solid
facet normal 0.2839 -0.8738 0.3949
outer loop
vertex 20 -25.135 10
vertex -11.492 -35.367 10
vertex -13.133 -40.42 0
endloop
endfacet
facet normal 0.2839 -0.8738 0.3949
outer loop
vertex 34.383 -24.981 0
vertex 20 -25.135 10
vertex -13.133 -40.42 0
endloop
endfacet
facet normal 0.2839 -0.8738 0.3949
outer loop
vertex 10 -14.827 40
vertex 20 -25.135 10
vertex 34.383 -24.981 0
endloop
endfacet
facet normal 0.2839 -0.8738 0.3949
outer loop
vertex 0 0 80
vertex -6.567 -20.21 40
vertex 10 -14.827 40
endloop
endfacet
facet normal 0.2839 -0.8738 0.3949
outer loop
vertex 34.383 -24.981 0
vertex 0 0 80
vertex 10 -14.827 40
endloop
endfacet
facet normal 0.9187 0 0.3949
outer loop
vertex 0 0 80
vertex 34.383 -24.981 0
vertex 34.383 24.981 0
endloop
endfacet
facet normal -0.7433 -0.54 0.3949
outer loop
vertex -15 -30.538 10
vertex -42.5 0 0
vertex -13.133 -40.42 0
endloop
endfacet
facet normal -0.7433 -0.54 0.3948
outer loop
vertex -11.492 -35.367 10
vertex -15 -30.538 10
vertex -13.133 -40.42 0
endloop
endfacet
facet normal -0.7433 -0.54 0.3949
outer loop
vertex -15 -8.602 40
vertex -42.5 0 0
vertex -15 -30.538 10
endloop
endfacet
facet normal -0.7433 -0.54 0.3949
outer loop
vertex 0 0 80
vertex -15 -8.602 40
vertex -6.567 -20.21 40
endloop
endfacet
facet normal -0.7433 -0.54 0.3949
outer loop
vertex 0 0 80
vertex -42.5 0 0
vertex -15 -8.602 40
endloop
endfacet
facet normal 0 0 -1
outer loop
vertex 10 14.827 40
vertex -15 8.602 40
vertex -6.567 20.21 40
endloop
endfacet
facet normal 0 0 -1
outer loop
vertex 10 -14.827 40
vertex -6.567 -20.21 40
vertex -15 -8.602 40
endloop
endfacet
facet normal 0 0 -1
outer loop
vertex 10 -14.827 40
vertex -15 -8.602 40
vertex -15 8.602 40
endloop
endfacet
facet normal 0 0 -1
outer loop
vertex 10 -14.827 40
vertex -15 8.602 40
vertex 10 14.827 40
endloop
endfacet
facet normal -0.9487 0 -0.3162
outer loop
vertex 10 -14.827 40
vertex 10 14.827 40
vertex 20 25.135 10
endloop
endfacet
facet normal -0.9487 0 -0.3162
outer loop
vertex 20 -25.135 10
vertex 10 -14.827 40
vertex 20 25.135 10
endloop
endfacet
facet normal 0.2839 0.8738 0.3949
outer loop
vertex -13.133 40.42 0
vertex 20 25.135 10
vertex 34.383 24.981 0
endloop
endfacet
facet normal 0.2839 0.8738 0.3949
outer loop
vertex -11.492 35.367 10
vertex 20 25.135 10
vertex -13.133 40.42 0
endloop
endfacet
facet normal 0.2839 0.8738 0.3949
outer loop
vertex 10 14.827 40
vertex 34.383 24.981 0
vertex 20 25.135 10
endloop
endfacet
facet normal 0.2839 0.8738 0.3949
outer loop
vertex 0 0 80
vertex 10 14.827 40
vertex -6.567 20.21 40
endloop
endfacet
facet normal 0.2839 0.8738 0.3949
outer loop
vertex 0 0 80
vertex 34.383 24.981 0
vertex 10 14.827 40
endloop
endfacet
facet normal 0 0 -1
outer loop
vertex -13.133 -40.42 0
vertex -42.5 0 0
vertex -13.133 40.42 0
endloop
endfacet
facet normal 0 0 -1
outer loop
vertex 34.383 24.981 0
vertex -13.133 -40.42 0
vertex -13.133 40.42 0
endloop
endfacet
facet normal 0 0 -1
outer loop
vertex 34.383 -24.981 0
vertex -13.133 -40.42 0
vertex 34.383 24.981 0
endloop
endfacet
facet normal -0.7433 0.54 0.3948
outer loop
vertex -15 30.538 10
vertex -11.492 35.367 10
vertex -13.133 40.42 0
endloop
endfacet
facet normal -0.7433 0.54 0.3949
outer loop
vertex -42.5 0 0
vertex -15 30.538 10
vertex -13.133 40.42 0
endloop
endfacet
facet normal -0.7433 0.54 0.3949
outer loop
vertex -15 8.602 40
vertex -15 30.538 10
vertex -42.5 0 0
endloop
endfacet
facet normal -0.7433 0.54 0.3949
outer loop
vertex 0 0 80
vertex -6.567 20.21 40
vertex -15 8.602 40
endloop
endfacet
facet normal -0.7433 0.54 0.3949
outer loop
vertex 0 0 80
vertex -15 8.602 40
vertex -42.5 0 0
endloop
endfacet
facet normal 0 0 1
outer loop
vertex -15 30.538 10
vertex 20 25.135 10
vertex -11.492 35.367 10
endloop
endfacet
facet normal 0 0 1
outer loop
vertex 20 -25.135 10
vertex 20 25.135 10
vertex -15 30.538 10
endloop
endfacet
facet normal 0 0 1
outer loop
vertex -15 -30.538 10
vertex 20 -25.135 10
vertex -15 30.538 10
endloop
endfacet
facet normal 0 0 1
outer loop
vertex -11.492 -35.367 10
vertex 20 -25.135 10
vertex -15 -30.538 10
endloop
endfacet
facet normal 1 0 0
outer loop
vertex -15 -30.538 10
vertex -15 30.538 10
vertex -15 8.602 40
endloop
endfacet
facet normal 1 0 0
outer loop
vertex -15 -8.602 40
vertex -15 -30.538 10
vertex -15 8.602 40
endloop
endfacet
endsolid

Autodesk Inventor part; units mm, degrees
ref_plane "YZ Plane" through (0, 0, 0) normal (1, 0, 0) x (0, 1, 0)
sketch "Эскиз1" plane through (0, 0, 0) normal (0, 0, 1) x (1, 0, 0)
  line L0 (-42.5, 0) -> (-13.1332, 40.4199)
  line L1 (-13.1332, 40.4199) -> (34.3832, 24.9809)
  line L2 (34.3832, 24.9809) -> (34.3832, -24.9809)
  line L3 (34.3832, -24.9809) -> (-13.1332, -40.4199)
  line L4 (-13.1332, -40.4199) -> (-42.5, 0)
  point P0 (0, 0)
  point P1 (0, 0)
ref_plane "РабПлоскость1" through (0, 0, 80) normal (0, 0, 1) x (1, 0, 0)
sketch "Эскиз2" plane through (0, 0, 80) normal (0, 0, 1) x (1, 0, 0)
  point P0 (0, 0)
  point P1 (0, 0)
loft "Лофт1" add profiles "Эскиз1" section 2 point at (0, 0, 80)
ref_plane "РабПлоскость2" through (0, -74.25, 0) normal (0, 1, 0) x (-1, 0, 0)
sketch "Эскиз3" plane through (0, -74.25, 0) normal (0, 1, 0) x (-1, 0, 0)
  line L0 (15, 40) -> (-10, 40)
  line L1 (-10, 10) -> (15, 10)
  line L2 (15, 10) -> (15, 40)
  line L3 (-10, 40) -> (-20, 10)
  line L4 (-20, 10) -> (-10, 10)
  point P0 (0, 0)
  point P1 (0, 80)
  point P2 (42.5, 0)
  point P3 (13.1332, 0)
  point P4 (-34.3832, 0)
  dimension "d7" = 25
  dimension "d8" = 30
  dimension "d9" = 15
  dimension "d10" = 35
  dimension "d11" = 10
extrude "Выдавливание1" cut sketch "Эскиз3" along normal through all
